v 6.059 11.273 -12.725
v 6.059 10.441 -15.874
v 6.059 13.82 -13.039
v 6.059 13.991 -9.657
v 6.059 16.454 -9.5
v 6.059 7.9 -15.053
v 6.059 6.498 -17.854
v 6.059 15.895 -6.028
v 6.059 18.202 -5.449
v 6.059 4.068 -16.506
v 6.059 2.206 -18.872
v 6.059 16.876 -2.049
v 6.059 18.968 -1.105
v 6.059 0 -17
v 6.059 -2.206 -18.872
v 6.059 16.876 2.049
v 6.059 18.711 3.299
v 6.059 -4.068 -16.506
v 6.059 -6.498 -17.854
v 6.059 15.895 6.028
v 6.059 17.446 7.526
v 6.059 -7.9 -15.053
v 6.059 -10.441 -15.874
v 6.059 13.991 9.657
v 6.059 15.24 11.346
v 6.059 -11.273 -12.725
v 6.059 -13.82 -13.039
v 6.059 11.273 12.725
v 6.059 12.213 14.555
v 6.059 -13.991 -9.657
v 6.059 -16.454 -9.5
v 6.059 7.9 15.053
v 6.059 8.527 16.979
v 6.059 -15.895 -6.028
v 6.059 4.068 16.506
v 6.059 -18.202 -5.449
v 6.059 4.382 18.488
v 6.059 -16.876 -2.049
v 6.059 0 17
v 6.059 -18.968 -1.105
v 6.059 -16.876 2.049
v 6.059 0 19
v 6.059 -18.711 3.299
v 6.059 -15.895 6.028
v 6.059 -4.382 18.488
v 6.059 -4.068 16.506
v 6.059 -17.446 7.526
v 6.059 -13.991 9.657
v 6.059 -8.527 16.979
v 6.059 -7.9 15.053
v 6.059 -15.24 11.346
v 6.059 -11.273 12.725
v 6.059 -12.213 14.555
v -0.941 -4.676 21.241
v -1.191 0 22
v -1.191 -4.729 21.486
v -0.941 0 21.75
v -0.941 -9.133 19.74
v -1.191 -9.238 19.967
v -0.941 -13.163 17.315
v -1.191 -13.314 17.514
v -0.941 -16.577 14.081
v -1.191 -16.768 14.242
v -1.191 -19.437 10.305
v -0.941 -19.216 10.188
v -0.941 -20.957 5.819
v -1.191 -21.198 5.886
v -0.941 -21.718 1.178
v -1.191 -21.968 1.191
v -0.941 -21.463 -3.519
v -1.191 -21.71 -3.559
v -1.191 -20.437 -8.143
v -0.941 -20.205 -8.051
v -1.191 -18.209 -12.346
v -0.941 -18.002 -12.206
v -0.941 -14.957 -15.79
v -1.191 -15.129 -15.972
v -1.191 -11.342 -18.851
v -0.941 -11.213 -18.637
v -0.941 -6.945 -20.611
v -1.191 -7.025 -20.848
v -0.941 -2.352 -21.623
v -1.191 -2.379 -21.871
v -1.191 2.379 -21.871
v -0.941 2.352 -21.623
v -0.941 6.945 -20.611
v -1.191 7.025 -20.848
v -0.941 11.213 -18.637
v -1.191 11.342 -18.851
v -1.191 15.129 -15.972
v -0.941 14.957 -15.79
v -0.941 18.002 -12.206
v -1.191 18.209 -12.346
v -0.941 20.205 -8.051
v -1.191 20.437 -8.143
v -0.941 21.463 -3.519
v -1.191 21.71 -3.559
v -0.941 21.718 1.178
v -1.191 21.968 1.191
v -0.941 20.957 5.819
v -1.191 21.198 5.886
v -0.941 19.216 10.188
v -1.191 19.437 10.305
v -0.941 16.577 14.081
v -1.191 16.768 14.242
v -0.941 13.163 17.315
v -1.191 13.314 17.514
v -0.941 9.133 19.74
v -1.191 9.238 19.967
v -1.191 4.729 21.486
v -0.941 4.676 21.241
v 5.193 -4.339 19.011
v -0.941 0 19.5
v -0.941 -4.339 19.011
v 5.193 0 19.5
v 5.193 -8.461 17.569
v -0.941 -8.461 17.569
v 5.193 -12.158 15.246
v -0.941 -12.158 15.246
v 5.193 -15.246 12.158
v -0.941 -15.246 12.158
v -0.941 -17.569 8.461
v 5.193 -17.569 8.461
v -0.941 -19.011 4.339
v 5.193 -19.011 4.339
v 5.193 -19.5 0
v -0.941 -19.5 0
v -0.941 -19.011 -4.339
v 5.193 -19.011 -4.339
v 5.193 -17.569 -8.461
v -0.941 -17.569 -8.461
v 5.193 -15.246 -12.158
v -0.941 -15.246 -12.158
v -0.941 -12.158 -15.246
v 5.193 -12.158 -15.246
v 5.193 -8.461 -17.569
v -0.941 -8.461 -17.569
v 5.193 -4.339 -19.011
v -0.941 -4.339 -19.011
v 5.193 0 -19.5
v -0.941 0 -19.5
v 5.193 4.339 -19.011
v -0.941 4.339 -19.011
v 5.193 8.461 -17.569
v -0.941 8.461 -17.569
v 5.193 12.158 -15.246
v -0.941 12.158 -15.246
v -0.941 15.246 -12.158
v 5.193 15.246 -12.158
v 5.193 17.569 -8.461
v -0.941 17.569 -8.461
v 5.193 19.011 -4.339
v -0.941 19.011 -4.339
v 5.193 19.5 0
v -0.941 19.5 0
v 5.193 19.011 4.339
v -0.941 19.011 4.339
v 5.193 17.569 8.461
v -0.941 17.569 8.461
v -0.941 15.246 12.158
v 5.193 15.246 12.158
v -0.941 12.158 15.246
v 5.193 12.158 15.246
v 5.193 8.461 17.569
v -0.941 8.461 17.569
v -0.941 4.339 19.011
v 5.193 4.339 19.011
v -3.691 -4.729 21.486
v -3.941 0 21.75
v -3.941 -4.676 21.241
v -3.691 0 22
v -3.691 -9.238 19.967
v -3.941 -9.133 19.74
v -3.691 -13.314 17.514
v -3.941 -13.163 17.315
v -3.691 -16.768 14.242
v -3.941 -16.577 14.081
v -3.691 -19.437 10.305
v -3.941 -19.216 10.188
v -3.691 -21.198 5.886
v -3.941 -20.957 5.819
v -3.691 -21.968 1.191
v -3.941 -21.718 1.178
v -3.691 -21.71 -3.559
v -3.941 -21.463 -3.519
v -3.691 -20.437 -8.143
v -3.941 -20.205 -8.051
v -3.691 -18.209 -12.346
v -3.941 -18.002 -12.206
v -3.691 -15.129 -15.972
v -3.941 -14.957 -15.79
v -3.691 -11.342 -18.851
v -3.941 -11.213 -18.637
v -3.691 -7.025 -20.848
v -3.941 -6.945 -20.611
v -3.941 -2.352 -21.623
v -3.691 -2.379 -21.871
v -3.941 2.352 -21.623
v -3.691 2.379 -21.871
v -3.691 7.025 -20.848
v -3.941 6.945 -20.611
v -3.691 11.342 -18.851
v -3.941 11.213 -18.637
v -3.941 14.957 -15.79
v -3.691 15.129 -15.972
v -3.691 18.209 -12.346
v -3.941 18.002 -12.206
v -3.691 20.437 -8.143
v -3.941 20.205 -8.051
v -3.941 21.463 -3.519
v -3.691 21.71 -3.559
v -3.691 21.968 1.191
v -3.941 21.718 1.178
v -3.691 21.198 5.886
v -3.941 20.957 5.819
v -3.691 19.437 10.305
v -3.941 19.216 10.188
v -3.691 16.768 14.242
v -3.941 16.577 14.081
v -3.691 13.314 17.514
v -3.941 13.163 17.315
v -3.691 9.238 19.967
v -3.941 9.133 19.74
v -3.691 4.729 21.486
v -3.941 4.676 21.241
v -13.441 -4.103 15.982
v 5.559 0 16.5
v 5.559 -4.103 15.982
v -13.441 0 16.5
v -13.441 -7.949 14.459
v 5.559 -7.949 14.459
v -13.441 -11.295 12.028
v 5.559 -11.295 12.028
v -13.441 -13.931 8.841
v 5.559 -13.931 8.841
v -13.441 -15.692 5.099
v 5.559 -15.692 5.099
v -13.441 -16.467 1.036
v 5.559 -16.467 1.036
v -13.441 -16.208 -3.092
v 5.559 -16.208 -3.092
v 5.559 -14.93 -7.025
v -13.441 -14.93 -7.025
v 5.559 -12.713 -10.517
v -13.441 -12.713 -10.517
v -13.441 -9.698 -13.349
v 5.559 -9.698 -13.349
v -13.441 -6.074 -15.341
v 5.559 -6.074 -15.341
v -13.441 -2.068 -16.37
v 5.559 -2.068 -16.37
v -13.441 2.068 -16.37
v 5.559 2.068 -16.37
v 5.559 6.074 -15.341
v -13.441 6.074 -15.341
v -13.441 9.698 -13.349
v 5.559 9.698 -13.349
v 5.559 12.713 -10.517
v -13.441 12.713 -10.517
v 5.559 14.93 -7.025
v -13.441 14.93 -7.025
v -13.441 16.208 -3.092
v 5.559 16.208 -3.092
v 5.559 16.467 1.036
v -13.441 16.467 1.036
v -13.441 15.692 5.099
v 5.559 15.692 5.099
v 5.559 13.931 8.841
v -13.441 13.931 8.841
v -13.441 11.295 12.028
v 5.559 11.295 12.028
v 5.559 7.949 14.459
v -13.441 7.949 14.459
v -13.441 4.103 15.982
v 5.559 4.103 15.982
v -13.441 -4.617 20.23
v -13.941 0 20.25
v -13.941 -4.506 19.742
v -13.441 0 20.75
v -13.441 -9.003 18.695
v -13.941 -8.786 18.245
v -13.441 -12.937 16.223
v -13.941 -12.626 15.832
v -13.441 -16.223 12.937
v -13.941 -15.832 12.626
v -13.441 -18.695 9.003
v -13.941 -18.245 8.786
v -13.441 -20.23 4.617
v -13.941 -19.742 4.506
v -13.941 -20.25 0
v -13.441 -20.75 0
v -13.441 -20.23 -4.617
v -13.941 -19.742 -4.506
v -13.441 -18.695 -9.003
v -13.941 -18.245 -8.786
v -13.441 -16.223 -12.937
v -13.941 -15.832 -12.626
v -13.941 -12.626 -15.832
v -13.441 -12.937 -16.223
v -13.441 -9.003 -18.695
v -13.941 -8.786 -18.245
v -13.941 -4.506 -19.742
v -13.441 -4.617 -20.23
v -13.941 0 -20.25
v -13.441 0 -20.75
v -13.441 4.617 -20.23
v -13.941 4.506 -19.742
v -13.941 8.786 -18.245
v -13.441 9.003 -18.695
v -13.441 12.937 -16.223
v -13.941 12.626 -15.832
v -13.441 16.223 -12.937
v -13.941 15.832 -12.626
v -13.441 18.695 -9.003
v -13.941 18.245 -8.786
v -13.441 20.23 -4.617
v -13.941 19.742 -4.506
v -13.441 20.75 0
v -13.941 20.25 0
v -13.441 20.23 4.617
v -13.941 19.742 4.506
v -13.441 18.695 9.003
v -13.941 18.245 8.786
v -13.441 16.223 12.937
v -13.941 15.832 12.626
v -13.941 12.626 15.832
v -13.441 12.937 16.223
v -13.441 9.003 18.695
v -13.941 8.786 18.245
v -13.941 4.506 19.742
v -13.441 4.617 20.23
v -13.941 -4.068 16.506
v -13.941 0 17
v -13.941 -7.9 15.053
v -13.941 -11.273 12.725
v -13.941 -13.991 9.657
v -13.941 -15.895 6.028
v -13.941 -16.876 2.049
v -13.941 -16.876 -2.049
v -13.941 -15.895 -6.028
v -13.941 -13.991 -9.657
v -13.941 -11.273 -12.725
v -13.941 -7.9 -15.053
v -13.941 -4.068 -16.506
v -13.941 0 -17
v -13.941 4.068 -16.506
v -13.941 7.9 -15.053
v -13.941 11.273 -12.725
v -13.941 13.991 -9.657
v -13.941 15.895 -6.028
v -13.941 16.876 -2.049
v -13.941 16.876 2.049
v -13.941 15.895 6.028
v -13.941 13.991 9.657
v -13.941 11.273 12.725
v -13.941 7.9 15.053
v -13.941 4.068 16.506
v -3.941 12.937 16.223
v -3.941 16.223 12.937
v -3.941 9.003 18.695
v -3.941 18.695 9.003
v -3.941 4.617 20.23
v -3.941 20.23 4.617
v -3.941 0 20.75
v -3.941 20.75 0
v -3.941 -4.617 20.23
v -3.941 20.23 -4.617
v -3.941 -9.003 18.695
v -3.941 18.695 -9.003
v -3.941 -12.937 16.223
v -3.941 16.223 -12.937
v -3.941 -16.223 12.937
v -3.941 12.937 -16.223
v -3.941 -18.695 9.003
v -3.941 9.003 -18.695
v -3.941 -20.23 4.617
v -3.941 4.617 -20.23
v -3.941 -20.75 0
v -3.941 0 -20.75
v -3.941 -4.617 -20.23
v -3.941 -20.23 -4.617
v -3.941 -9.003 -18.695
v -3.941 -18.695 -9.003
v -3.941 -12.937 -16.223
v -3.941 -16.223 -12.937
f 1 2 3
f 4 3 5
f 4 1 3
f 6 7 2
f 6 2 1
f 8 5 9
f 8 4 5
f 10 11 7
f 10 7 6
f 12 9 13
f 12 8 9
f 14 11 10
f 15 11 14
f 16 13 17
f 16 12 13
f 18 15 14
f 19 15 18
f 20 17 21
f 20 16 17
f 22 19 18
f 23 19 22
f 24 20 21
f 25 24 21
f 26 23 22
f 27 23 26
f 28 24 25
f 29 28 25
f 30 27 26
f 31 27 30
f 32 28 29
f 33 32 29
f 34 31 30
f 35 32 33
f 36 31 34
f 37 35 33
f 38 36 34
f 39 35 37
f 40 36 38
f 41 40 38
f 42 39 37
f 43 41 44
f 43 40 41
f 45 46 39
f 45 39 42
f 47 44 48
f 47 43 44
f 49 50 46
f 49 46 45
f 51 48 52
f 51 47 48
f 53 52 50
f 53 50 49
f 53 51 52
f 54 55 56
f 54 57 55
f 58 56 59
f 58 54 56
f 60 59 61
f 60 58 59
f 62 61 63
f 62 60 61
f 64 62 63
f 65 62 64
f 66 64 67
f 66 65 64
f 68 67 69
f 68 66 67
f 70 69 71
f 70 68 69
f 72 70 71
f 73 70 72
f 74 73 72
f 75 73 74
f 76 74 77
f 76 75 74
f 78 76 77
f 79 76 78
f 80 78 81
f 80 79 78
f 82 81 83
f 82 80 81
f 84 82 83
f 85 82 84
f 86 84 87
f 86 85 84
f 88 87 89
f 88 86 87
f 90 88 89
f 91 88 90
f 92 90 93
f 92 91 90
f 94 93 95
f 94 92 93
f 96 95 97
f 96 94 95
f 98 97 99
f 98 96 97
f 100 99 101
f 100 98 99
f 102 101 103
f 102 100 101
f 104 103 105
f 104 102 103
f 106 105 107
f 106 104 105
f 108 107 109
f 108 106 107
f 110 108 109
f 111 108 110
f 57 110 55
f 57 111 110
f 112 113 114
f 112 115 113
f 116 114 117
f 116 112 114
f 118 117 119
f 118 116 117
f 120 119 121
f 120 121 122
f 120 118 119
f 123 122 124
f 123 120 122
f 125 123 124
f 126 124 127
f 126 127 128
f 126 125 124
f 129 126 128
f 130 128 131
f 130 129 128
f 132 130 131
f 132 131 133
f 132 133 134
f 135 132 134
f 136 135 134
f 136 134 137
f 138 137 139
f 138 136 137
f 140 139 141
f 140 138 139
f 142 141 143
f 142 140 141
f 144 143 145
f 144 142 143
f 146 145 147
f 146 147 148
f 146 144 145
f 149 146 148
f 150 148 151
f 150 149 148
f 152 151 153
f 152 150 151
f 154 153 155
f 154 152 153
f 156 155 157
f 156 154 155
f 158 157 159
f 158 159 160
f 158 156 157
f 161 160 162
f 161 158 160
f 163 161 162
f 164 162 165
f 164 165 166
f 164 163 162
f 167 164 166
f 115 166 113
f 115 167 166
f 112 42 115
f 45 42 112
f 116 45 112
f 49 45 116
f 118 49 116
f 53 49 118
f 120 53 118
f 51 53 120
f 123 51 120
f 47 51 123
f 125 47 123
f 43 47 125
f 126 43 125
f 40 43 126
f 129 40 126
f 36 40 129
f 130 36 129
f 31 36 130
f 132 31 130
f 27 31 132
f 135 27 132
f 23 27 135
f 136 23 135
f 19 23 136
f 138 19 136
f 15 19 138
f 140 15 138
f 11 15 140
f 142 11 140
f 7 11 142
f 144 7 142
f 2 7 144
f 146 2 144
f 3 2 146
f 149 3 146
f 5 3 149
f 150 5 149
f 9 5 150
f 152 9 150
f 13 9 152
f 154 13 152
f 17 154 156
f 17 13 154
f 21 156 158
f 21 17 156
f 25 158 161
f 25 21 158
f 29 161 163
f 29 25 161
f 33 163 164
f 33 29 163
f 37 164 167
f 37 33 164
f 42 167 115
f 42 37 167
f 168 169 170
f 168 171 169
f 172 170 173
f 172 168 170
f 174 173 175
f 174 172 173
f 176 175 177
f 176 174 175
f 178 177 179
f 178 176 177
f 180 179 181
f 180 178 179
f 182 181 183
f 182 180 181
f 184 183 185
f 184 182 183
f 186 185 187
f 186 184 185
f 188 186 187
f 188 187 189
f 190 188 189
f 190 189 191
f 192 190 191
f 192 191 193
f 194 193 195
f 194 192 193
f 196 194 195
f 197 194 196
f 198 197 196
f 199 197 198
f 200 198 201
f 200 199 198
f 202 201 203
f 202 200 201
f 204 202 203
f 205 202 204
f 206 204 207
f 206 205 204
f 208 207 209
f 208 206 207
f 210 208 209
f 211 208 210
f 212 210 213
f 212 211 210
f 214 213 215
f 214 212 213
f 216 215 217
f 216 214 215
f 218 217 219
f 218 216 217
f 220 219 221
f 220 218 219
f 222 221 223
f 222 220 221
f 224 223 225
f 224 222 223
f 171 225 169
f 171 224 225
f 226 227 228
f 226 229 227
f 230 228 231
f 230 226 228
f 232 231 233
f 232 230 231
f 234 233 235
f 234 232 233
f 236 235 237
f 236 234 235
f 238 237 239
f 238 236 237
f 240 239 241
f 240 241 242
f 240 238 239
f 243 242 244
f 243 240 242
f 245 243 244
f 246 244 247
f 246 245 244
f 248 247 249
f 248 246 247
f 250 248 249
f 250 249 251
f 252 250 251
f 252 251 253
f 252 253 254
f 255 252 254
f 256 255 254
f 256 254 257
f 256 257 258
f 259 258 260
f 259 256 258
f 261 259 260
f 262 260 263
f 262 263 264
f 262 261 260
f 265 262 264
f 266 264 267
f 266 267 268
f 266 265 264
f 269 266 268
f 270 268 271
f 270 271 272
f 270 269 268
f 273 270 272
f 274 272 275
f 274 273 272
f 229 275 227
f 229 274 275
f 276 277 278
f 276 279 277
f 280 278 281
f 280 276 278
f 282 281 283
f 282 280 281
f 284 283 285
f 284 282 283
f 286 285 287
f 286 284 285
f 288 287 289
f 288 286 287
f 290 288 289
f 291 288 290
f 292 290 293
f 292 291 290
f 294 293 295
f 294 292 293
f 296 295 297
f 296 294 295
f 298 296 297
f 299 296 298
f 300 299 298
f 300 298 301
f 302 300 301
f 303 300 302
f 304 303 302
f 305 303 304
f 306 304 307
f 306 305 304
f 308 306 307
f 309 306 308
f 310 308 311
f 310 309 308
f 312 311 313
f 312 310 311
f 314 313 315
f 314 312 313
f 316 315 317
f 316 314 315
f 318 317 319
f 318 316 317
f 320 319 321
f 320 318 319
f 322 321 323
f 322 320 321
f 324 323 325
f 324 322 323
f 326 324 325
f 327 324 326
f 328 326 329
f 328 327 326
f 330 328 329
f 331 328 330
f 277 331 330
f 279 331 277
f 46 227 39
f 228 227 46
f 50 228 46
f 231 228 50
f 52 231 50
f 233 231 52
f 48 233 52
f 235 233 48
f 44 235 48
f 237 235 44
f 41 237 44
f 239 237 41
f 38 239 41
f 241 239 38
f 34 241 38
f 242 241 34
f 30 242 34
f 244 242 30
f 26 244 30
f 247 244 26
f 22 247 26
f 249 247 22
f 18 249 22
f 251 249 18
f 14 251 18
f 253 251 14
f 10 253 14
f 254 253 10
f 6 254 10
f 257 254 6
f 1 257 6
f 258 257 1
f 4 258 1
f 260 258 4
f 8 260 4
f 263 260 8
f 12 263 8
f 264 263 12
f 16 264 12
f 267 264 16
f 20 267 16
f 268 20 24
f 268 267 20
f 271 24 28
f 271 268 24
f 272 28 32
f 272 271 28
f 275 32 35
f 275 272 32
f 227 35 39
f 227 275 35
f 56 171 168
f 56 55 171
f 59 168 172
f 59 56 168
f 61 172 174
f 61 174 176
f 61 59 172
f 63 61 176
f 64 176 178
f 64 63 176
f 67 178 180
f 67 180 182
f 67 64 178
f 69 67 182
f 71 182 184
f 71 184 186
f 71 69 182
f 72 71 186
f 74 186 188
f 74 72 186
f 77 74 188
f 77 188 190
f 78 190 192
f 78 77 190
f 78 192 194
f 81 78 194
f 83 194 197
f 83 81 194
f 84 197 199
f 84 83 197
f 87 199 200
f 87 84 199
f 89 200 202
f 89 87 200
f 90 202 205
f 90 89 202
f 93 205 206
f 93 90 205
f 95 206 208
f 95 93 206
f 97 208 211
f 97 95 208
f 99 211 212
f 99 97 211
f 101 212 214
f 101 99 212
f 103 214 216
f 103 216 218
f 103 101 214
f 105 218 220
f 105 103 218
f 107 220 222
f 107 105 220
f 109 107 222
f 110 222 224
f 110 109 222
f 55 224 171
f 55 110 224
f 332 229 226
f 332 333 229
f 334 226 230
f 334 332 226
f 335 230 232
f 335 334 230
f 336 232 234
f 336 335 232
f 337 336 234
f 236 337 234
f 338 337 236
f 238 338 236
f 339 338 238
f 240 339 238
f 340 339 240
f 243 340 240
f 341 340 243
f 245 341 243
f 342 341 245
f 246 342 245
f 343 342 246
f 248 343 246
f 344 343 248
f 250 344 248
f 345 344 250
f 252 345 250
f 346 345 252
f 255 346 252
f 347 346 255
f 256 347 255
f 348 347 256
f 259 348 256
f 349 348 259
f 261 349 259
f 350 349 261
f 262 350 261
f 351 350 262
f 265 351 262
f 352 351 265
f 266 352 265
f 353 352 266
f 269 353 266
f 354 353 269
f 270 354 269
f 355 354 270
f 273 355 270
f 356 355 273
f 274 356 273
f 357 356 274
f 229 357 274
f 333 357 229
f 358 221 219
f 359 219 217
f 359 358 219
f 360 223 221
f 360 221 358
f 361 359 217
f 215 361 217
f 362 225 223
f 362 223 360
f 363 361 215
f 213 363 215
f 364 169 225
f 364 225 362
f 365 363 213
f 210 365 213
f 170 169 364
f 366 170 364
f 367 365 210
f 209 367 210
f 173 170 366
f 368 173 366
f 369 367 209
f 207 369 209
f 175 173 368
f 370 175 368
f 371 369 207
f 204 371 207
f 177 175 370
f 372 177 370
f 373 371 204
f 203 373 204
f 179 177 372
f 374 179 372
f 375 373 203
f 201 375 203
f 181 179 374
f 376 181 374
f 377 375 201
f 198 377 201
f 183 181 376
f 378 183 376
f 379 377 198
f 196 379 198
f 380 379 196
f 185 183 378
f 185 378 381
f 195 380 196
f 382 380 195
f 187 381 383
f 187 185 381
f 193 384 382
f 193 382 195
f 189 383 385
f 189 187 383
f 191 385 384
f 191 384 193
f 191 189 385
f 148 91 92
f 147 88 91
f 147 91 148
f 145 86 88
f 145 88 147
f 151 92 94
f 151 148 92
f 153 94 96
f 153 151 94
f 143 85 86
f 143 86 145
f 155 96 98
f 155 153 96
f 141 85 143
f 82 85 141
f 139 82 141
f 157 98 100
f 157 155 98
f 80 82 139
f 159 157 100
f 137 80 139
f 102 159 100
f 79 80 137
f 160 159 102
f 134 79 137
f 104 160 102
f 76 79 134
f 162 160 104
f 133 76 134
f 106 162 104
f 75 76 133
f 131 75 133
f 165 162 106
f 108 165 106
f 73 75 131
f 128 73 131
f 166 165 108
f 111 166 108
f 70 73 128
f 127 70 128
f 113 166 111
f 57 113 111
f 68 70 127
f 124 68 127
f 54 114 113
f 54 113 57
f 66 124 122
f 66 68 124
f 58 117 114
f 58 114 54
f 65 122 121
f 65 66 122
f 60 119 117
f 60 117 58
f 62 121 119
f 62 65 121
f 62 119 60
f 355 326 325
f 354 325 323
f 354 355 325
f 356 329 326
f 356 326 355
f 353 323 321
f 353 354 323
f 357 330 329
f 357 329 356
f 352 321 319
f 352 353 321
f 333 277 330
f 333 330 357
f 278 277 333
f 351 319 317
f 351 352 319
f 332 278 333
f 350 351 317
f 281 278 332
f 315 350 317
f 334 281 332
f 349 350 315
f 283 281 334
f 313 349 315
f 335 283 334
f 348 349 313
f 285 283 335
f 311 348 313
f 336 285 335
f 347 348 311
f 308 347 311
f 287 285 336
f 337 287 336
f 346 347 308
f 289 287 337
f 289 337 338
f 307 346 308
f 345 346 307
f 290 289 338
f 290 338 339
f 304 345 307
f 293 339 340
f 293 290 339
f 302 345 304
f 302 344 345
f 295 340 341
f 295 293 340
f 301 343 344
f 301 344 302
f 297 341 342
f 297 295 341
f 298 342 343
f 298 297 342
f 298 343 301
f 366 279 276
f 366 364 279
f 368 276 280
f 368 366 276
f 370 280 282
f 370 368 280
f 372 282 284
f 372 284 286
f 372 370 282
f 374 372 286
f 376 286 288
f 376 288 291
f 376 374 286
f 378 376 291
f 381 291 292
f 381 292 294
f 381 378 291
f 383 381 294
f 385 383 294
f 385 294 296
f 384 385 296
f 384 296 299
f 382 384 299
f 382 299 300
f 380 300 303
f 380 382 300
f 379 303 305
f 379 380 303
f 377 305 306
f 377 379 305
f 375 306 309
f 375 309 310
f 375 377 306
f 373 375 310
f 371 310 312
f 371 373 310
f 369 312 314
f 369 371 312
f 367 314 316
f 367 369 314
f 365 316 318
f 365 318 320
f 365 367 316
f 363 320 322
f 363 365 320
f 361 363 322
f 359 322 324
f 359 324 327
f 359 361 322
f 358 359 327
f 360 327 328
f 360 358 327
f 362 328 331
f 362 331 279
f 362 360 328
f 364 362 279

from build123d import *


with BuildPart() as part:
    # Esquisse1 → Révolution1 (revolve)
    with BuildSketch(Plane.XY, mode=Mode.PRIVATE) as r_volution1_sk:
        Polygon((-13.941052428, 17), (-13.941052428, 20.25), (-13.441052428, 20.75), (-3.941052428, 20.75), (-3.941052428, 21.75), (-3.691052428, 22), (-1.191052428, 22), (-0.941052428, 21.75), (-0.941052428, 19.5), (5.192922168, 19.5), (6.058947572, 19), (6.058947572, 17), (5.558947572, 16.5), (-13.441052428, 16.5), align=None)
    revolve(r_volution1_sk.sketch.rotate(Axis((0, 0, 0), (1, 0, 0)), 90), axis=Axis((0, 0, 0), (1, 0, 0)))  # turned: the seam where the file's is


solid = part.part
